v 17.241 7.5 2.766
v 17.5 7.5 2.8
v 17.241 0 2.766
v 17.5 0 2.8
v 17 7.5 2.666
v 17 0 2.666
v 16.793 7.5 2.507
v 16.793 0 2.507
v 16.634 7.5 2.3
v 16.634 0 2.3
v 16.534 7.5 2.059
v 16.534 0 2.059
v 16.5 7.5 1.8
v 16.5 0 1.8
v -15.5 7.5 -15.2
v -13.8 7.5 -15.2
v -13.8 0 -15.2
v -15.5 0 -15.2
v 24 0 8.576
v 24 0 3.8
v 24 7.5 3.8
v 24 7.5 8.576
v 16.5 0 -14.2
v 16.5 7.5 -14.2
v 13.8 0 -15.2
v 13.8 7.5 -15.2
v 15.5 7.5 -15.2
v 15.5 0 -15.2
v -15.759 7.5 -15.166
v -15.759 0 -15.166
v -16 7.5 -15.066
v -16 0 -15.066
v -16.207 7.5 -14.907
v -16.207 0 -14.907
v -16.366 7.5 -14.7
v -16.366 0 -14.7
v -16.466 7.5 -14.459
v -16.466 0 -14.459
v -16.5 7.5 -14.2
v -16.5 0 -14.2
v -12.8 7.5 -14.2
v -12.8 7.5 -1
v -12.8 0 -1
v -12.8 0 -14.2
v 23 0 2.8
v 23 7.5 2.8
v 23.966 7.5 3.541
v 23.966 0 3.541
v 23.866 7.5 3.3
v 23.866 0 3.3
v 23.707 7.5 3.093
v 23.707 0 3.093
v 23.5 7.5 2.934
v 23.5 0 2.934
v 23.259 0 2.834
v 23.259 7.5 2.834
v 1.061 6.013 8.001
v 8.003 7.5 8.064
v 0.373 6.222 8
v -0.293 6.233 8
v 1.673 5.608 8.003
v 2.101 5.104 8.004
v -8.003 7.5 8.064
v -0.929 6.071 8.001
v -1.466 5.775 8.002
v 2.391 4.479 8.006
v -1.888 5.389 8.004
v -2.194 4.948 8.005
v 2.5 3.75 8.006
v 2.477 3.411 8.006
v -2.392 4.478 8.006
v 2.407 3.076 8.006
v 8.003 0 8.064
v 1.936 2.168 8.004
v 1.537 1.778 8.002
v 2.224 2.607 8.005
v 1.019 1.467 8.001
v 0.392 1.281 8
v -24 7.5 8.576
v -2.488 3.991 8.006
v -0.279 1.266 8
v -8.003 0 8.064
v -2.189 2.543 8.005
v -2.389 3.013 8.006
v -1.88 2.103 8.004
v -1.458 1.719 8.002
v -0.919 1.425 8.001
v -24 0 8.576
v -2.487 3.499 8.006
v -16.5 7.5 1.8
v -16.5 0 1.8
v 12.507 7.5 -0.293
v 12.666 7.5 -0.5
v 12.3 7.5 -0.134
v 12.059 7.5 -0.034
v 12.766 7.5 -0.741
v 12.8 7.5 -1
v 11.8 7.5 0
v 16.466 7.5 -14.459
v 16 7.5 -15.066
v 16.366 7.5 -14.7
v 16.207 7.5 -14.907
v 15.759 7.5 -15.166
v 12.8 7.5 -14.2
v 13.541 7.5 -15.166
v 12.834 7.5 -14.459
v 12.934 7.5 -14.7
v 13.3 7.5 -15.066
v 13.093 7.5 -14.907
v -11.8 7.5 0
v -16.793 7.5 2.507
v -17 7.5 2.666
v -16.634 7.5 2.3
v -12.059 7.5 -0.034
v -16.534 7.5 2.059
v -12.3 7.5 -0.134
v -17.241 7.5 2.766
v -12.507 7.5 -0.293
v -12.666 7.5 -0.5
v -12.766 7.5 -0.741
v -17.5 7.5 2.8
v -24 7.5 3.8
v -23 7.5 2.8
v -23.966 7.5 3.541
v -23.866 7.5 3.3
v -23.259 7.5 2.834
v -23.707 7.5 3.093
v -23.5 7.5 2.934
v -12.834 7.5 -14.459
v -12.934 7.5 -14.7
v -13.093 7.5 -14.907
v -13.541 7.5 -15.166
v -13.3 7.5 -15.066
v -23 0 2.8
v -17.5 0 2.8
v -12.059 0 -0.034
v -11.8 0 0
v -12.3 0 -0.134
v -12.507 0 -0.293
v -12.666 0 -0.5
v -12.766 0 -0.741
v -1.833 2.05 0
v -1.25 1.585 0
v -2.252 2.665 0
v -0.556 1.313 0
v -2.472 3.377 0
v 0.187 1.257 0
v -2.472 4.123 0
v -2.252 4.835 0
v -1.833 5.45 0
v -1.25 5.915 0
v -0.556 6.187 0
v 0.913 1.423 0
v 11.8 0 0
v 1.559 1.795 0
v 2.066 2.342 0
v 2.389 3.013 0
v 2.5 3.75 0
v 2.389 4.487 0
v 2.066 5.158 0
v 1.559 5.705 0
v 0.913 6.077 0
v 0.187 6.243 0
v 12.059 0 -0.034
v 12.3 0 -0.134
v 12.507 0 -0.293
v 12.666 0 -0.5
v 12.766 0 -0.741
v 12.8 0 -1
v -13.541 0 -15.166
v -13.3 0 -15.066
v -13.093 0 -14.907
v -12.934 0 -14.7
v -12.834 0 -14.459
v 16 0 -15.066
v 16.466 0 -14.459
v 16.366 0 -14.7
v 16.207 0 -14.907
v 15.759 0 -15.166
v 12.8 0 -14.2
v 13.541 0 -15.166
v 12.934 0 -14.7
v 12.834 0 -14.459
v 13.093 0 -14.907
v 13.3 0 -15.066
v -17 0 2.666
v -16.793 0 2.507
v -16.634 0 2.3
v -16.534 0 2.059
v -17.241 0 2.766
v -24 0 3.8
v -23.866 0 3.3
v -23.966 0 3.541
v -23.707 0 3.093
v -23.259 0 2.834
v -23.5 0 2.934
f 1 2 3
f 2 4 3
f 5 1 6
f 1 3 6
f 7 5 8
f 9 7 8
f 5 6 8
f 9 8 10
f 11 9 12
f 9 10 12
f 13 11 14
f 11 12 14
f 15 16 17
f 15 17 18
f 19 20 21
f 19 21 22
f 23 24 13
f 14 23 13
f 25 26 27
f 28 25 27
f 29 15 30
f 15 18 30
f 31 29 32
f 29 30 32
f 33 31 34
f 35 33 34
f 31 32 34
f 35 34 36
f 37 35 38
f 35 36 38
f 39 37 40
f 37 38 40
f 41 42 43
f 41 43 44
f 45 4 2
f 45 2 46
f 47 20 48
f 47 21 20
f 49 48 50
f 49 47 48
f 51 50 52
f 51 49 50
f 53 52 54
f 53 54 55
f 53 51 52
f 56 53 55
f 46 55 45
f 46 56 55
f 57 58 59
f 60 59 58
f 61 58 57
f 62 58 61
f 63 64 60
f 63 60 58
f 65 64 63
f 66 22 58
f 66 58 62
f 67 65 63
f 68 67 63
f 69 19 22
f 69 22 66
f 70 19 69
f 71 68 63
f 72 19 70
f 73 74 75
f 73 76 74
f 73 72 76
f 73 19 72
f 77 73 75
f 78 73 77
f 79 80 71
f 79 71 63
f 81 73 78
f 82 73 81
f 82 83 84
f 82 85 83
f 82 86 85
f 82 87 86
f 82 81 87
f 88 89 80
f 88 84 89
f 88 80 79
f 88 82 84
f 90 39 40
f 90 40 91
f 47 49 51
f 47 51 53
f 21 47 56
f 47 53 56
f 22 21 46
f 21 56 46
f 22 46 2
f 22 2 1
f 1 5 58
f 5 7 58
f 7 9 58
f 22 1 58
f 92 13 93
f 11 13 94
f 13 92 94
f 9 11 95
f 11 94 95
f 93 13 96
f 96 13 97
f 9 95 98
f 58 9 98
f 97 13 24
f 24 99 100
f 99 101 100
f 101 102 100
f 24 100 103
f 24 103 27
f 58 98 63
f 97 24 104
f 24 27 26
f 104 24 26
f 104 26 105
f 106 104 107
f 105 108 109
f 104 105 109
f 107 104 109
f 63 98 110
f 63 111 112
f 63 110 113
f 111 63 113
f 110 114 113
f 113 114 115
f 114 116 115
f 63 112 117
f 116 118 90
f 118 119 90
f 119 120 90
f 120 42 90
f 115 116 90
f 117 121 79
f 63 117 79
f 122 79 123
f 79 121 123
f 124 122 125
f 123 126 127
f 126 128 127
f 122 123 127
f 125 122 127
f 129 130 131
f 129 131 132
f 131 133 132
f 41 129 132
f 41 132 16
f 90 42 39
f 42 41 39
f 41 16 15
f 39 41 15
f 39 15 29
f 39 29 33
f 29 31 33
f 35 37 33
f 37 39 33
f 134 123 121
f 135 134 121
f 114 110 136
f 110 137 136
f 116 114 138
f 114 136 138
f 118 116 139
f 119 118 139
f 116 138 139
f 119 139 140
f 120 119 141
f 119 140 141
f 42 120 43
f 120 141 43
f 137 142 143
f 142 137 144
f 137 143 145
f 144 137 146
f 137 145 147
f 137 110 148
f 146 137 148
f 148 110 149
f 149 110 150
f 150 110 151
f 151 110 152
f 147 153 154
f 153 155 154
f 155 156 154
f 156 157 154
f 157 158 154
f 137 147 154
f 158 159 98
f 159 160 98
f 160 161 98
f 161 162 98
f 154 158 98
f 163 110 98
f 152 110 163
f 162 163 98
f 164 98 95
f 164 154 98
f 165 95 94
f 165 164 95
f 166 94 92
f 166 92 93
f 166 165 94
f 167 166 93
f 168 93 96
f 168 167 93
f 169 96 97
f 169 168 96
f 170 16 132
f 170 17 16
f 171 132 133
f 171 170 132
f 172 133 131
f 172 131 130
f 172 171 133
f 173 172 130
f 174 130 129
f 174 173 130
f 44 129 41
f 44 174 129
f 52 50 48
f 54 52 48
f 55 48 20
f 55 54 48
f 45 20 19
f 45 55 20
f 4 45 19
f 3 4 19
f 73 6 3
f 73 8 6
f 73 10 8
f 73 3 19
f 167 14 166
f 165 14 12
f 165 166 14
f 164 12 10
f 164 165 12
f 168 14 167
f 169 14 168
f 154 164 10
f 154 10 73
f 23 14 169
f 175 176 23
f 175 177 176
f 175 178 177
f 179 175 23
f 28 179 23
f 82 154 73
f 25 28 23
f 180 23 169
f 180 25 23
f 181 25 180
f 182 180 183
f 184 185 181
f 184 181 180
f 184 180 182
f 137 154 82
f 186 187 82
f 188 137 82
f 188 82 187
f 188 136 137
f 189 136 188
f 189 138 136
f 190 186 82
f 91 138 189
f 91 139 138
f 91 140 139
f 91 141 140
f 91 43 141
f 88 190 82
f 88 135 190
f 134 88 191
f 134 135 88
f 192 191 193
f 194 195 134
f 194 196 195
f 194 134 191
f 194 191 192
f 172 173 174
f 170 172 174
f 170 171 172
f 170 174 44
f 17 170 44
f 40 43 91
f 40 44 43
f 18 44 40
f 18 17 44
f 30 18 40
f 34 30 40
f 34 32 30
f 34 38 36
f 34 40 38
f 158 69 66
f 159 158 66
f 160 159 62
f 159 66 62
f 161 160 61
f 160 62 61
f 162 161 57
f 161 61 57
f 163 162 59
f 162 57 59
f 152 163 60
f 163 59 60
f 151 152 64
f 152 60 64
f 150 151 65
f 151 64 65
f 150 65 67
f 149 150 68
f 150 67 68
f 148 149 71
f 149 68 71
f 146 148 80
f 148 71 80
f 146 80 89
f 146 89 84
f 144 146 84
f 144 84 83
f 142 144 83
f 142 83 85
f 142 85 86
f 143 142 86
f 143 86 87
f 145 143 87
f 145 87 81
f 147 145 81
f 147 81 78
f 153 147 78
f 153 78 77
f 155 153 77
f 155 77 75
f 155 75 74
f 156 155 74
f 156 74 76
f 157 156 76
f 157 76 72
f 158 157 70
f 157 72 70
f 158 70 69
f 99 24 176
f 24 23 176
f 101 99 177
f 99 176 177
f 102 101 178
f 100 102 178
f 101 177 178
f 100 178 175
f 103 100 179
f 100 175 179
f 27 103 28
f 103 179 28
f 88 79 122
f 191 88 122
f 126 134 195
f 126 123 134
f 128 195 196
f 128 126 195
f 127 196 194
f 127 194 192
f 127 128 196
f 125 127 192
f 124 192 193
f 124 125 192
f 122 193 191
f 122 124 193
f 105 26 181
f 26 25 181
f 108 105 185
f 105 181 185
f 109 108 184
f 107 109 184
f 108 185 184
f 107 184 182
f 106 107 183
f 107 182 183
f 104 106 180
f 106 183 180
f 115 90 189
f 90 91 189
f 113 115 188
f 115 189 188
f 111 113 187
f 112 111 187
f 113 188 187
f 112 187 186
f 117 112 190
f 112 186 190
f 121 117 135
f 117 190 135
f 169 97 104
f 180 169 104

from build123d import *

# Parameters (mm, degrees)
BOSS_EXTRUDE1_DEPTH       = 7.5
BOSS_EXTRUDE2_DEPTH       = 7.5
FILLET1_R                 = 1
M6X1_0_TAPPED_HOLE1_D     = 5
M6X1_0_TAPPED_HOLE1_DEPTH = 9
M6X1_0_TAPPED_HOLE1_TIP   = 1.502151548


with BuildPart() as part:
    # Sketch1 → Boss-Extrude1 (new body)
    with BuildSketch(Plane(origin=(0, 0, 0), x_dir=(1, 0, 0), z_dir=(0, 1, 0))):
        with BuildLine():
            Line((-12, 0), (0, 0))
            Line((0, 0), (12, 0))
            Line((12, 0), (12, -2.8))
            Line((12, -2.8), (24, -2.8))
            Line((24, -2.8), (24, -8.576332159))
            ThreePointArc((24, -8.576332159), (0, -8), (-24, -8.576332159))
            Line((-24, -8.576332159), (-24, -2.8))
            Line((-24, -2.8), (-12, -2.8))
            Line((-12, -2.8), (-12, 0))
        make_face()
    extrude(amount=BOSS_EXTRUDE1_DEPTH)

    # Sketch5 → Boss-Extrude2 (add)
    with BuildSketch(Plane(origin=(0, 7.5, 0), x_dir=(1, 0, 0), z_dir=(0, 1, 0))):
        Polygon((12, 0), (12.8, 0), (12.8, 15.2), (16.5, 15.2), (16.5, -2.8), (12, -2.8), align=None)
        Polygon((-12, -2.8), (-12, 0), (-12.8, 0), (-12.8, 15.2), (-16.5, 15.2), (-16.5, -2.8), align=None)
    extrude(amount=-BOSS_EXTRUDE2_DEPTH)

    # Fillet1
    fillet1_edges = [part.edges().sort_by_distance(p)[0] for p in [
        (24, 3.75, 2.8),
        (-24, 3.75, 2.8),
        (16.5, 3.75, 2.8),
        (16.5, 3.75, -15.2),
        (12.8, 3.75, -15.2),
        (12.8, 3.75, 0),
        (-12.8, 3.75, 0),
        (-12.8, 3.75, -15.2),
        (-16.5, 3.75, -15.2),
        (-16.5, 3.75, 2.8),
    ]]
    fillet(fillet1_edges, radius=FILLET1_R)

    # M6x1.0 Tapped Hole1
    with Locations(Plane(origin=(0, 0, 0), x_dir=(-1, 0, 0), z_dir=(0, 0, -1))):
        with Locations((0, 3.75)):
            Hole(M6X1_0_TAPPED_HOLE1_D / 2, depth=M6X1_0_TAPPED_HOLE1_DEPTH)
            with Locations((0, 0, -(M6X1_0_TAPPED_HOLE1_DEPTH + M6X1_0_TAPPED_HOLE1_TIP / 2))):  # 118° drill point
                Cone(0, M6X1_0_TAPPED_HOLE1_D / 2, M6X1_0_TAPPED_HOLE1_TIP, mode=Mode.SUBTRACT)


solid = part.part
